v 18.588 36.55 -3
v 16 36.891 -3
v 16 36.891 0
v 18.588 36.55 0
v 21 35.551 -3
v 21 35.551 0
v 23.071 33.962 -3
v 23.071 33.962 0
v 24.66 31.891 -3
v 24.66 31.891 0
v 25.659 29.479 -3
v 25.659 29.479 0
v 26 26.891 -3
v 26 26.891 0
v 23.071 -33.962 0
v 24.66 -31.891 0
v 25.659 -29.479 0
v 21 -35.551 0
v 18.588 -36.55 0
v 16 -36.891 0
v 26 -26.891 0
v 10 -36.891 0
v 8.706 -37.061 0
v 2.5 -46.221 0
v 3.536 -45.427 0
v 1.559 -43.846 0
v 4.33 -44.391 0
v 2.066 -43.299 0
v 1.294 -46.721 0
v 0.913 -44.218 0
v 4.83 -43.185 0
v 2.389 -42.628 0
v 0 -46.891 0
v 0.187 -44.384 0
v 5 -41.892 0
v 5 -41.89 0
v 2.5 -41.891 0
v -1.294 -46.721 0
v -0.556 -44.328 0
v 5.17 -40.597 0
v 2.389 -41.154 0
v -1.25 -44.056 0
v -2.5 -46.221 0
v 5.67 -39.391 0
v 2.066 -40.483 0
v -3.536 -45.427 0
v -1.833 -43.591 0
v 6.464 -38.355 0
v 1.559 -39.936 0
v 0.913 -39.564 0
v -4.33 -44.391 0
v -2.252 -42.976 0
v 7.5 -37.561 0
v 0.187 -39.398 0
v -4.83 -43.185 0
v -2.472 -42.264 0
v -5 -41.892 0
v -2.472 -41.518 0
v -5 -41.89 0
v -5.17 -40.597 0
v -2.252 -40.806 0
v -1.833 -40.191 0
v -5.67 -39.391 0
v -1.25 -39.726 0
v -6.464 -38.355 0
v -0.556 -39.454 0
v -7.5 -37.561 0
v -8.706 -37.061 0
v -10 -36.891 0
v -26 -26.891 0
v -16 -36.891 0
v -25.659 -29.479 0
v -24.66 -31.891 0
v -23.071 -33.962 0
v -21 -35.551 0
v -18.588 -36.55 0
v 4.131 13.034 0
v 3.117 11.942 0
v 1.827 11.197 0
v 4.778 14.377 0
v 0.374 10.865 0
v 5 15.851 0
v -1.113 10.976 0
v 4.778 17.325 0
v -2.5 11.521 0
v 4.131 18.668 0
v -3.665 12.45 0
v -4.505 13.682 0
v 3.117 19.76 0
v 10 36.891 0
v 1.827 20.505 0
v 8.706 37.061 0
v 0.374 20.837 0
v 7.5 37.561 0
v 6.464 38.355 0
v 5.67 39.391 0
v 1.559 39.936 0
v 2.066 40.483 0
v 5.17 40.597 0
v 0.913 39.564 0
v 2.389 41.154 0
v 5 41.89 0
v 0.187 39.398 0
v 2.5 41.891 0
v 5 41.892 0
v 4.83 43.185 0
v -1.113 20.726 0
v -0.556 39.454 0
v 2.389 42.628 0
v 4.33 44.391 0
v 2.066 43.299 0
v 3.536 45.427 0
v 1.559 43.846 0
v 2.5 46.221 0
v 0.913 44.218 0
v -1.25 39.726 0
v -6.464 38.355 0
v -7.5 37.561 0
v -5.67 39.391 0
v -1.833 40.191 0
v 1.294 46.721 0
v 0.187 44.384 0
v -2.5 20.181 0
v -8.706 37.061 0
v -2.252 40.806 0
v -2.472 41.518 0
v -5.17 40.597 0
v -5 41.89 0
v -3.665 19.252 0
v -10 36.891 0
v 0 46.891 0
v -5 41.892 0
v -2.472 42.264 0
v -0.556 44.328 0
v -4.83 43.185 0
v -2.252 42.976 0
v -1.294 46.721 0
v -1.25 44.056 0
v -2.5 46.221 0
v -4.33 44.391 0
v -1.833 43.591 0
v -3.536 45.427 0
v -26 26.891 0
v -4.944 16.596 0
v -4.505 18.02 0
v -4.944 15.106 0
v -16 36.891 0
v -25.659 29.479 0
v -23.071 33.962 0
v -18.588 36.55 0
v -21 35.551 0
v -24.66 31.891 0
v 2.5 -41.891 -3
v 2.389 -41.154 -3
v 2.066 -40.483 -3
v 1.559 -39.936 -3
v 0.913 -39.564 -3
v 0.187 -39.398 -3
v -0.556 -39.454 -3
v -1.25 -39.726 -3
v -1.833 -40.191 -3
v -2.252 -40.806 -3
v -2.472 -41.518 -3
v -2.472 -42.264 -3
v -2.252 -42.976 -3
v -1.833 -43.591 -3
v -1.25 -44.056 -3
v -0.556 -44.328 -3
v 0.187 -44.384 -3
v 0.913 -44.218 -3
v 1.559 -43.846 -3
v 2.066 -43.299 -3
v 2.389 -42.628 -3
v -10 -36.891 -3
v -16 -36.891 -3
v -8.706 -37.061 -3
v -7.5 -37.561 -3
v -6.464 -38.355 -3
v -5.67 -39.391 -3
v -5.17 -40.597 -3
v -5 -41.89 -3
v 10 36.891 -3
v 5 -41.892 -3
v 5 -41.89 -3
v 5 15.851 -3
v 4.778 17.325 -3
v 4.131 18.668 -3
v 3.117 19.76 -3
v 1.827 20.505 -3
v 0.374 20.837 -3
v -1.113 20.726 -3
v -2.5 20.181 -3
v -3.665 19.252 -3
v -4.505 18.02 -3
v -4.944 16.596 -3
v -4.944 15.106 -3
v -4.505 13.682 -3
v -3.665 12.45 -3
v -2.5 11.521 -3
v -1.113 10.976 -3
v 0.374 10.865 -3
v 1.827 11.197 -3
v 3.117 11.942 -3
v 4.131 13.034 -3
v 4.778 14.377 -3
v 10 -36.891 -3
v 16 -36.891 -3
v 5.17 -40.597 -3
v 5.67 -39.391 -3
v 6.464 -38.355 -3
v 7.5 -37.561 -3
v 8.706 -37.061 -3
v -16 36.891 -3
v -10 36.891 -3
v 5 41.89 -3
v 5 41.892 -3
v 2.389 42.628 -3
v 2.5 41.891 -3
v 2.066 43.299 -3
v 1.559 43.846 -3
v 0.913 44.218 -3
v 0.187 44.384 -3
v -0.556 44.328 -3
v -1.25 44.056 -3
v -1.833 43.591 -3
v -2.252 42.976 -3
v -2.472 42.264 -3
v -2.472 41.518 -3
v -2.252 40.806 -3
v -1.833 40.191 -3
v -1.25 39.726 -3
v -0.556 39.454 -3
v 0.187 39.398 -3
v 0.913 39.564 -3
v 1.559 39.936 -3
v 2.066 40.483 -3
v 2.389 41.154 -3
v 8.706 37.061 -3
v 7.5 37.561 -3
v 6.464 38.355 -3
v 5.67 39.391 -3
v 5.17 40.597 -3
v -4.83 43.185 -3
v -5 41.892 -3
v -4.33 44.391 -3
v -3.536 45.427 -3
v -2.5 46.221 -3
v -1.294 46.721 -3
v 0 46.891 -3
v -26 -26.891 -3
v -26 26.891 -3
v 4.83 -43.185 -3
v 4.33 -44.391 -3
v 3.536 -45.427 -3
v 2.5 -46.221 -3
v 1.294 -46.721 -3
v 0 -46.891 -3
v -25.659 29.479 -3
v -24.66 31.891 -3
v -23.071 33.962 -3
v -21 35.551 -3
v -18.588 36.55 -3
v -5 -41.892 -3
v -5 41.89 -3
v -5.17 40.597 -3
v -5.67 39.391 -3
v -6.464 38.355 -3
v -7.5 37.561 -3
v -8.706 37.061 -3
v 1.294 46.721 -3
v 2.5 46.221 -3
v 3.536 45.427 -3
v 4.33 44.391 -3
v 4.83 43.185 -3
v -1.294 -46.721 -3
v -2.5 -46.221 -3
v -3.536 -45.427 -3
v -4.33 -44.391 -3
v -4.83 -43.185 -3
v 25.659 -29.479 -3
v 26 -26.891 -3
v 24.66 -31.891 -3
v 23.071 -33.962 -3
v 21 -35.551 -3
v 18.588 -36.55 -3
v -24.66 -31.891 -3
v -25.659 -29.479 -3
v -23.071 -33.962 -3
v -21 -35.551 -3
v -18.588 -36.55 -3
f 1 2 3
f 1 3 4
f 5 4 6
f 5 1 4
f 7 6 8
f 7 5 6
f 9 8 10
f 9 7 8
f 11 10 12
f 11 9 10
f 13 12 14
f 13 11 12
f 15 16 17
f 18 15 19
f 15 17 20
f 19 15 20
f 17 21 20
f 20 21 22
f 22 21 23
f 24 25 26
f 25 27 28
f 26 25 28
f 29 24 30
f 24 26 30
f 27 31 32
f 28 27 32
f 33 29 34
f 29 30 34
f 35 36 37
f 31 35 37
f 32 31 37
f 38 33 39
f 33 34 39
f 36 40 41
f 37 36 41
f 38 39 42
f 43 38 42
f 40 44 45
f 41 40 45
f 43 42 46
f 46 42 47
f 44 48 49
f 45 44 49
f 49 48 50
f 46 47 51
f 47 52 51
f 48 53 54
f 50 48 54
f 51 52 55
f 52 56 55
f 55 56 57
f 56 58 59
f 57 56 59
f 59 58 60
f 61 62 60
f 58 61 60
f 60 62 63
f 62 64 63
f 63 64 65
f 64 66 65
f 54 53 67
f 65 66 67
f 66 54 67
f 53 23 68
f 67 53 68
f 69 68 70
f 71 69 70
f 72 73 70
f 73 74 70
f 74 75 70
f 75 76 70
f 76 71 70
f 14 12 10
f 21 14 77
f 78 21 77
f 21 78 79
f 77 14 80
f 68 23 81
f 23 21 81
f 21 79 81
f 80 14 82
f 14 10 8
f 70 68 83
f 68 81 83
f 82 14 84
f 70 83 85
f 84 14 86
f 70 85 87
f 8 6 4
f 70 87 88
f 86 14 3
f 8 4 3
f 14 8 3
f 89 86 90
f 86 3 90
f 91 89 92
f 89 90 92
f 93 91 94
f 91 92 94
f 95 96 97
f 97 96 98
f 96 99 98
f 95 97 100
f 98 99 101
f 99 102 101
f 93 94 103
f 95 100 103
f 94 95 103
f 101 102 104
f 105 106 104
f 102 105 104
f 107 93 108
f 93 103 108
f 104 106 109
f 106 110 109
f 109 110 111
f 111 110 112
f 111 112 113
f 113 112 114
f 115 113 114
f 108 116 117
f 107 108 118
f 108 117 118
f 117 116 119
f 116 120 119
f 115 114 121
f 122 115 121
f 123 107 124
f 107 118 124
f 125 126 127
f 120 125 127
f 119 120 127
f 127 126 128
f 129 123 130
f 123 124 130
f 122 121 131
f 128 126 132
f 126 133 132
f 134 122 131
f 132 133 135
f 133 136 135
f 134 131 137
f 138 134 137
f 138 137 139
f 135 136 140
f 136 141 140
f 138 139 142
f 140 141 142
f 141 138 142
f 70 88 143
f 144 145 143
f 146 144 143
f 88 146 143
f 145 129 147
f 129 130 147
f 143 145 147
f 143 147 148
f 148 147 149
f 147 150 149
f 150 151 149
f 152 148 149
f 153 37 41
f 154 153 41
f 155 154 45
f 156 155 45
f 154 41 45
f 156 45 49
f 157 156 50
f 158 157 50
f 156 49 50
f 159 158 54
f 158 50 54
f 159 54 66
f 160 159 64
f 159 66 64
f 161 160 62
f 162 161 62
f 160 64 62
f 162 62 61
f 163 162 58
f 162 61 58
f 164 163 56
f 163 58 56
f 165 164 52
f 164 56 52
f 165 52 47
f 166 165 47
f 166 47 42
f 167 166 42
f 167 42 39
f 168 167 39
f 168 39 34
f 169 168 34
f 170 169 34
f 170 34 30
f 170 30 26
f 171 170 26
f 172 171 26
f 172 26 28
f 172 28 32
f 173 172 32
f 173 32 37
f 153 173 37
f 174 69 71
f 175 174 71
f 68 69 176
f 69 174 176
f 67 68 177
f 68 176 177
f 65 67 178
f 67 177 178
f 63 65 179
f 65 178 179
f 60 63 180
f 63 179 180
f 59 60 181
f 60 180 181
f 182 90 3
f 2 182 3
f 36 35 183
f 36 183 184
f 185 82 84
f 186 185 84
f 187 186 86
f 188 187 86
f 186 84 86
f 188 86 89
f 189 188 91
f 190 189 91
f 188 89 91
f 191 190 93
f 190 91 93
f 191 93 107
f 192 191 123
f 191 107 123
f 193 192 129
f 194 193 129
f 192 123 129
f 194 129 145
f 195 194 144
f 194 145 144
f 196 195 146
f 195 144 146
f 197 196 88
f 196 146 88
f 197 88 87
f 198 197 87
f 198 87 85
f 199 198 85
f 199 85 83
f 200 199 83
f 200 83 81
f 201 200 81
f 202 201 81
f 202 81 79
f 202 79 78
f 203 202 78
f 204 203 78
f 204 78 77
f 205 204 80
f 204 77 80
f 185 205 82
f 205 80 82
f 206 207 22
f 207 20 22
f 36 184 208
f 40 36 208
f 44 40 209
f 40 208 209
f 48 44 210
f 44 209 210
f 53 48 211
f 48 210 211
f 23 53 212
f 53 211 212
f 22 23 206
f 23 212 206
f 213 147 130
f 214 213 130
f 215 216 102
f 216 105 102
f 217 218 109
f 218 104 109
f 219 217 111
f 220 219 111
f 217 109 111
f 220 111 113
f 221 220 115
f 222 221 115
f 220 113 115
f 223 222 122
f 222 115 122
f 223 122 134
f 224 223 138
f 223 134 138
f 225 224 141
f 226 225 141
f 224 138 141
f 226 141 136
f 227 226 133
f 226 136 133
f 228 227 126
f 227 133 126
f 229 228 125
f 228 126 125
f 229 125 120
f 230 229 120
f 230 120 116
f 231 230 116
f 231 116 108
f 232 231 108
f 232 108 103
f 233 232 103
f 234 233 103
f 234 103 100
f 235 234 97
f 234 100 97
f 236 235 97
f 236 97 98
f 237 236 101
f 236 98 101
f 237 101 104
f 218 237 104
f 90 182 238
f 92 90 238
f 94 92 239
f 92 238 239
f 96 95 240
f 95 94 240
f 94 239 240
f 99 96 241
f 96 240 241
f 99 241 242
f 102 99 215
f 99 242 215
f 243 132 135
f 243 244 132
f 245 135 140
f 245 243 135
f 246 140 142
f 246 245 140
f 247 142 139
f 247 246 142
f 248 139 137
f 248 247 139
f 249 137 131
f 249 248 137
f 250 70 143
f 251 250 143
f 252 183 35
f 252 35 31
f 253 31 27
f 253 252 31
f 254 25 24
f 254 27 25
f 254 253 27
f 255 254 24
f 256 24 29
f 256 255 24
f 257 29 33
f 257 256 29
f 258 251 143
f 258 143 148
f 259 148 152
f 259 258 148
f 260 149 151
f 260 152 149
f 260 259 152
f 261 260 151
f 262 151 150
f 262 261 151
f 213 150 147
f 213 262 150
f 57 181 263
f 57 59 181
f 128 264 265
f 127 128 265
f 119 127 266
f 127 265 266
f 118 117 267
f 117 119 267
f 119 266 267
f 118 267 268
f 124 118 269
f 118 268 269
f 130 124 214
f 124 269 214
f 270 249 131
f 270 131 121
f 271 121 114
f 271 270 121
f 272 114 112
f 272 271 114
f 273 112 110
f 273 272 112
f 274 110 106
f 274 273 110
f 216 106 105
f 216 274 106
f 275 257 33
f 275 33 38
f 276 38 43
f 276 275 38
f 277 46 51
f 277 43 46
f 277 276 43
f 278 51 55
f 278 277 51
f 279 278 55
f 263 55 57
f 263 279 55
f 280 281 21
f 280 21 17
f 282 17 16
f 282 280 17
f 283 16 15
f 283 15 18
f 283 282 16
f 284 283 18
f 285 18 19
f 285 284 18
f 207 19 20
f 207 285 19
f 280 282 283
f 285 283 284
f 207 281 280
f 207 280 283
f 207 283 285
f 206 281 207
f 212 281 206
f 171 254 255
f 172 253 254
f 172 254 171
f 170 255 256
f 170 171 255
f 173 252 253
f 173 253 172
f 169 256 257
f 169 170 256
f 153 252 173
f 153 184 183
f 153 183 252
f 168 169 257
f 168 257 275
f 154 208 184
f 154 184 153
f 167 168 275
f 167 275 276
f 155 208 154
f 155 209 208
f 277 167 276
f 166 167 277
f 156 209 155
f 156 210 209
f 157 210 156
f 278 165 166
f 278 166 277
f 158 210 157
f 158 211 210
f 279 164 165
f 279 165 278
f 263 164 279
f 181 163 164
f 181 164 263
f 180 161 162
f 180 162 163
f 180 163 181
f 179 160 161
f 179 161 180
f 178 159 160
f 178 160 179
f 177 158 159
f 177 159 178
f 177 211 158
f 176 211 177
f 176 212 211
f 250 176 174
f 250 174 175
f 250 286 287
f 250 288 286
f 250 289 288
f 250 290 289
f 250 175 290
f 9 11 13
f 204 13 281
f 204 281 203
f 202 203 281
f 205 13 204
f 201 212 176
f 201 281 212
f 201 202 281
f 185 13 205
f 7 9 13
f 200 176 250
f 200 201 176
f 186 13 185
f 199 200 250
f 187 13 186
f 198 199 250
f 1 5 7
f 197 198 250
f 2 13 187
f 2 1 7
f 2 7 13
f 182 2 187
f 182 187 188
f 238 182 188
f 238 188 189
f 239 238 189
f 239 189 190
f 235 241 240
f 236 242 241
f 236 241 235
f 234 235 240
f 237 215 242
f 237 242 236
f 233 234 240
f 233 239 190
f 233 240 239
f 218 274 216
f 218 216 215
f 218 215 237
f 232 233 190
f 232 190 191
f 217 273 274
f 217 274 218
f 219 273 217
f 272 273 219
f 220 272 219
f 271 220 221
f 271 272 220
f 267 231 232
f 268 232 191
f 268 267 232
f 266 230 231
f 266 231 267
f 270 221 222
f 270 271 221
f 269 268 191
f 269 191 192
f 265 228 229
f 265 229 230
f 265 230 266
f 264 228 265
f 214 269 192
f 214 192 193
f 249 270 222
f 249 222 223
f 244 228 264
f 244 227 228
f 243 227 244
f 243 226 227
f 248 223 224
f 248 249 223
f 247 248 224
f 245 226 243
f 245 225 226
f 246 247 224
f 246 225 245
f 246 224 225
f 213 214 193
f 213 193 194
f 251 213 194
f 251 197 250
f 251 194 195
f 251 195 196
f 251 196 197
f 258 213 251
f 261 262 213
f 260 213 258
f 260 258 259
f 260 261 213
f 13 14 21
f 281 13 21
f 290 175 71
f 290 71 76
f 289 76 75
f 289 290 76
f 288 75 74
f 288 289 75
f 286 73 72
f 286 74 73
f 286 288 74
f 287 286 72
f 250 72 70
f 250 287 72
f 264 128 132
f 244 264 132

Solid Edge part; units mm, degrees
sketch "Sketch1" plane through (0, 0, 0) normal (0, 0, 1) x (1, 0, 0)
  circle A0 centre (0, 41.891) radius 2.5
  line L0 (-5, 46.891) -> (5, 46.891)
  line L1 (5, 46.891) -> (5, 36.891)
  line L2 (5, 36.891) -> (-5, 36.891)
  line L3 (-5, 36.891) -> (-5, 46.891)
  circle A1 centre (0, -41.891) radius 2.5
  line L4 (-5, -46.891) -> (5, -46.891)
  line L5 (5, -46.891) -> (5, -36.891)
  line L6 (5, -36.891) -> (-5, -36.891)
  line L7 (-5, -36.891) -> (-5, -46.891)
  line L8 (-26, 36.891) -> (26, 36.891)
  line L9 (26, 36.891) -> (26, -36.891)
  line L10 (26, -36.891) -> (-26, -36.891)
  line L11 (-26, -36.891) -> (-26, 36.891)
  circle A2 centre (0, 15.851) radius 5
  dimension "D1" = 52
  dimension "D2" = 73.782
  dimension "D3" = 5
  dimension "D4" = 5
  dimension "D5" = 10
  dimension "D6" = 10
  dimension "D7" = 5
  dimension "D8" = 10
  dimension "D9" = 10
  dimension "D10" = 5
  dimension "D11" = 21.04
  dimension "D12" = 10
extrude "Protrusion1" add sketch "Sketch1" against normal blind 3
fillet "v_10" radius 10 4 edges at (26, -36.891, -1.5) (26, 36.891, -1.5) (-26, 36.891, -1.5) (-26, -36.891, -1.5)
fillet "v_5" radius 5 8 edges at (5, -46.891, -1.5) (-5, -46.891, -1.5) (5, -36.891, -1.5) (-5, -36.891, -1.5) (5, 46.891, -1.5) (5, 36.891, -1.5) (-5, 46.891, -1.5) (-5, 36.891, -1.5)
properties material "ABS Plastic, high impact"
